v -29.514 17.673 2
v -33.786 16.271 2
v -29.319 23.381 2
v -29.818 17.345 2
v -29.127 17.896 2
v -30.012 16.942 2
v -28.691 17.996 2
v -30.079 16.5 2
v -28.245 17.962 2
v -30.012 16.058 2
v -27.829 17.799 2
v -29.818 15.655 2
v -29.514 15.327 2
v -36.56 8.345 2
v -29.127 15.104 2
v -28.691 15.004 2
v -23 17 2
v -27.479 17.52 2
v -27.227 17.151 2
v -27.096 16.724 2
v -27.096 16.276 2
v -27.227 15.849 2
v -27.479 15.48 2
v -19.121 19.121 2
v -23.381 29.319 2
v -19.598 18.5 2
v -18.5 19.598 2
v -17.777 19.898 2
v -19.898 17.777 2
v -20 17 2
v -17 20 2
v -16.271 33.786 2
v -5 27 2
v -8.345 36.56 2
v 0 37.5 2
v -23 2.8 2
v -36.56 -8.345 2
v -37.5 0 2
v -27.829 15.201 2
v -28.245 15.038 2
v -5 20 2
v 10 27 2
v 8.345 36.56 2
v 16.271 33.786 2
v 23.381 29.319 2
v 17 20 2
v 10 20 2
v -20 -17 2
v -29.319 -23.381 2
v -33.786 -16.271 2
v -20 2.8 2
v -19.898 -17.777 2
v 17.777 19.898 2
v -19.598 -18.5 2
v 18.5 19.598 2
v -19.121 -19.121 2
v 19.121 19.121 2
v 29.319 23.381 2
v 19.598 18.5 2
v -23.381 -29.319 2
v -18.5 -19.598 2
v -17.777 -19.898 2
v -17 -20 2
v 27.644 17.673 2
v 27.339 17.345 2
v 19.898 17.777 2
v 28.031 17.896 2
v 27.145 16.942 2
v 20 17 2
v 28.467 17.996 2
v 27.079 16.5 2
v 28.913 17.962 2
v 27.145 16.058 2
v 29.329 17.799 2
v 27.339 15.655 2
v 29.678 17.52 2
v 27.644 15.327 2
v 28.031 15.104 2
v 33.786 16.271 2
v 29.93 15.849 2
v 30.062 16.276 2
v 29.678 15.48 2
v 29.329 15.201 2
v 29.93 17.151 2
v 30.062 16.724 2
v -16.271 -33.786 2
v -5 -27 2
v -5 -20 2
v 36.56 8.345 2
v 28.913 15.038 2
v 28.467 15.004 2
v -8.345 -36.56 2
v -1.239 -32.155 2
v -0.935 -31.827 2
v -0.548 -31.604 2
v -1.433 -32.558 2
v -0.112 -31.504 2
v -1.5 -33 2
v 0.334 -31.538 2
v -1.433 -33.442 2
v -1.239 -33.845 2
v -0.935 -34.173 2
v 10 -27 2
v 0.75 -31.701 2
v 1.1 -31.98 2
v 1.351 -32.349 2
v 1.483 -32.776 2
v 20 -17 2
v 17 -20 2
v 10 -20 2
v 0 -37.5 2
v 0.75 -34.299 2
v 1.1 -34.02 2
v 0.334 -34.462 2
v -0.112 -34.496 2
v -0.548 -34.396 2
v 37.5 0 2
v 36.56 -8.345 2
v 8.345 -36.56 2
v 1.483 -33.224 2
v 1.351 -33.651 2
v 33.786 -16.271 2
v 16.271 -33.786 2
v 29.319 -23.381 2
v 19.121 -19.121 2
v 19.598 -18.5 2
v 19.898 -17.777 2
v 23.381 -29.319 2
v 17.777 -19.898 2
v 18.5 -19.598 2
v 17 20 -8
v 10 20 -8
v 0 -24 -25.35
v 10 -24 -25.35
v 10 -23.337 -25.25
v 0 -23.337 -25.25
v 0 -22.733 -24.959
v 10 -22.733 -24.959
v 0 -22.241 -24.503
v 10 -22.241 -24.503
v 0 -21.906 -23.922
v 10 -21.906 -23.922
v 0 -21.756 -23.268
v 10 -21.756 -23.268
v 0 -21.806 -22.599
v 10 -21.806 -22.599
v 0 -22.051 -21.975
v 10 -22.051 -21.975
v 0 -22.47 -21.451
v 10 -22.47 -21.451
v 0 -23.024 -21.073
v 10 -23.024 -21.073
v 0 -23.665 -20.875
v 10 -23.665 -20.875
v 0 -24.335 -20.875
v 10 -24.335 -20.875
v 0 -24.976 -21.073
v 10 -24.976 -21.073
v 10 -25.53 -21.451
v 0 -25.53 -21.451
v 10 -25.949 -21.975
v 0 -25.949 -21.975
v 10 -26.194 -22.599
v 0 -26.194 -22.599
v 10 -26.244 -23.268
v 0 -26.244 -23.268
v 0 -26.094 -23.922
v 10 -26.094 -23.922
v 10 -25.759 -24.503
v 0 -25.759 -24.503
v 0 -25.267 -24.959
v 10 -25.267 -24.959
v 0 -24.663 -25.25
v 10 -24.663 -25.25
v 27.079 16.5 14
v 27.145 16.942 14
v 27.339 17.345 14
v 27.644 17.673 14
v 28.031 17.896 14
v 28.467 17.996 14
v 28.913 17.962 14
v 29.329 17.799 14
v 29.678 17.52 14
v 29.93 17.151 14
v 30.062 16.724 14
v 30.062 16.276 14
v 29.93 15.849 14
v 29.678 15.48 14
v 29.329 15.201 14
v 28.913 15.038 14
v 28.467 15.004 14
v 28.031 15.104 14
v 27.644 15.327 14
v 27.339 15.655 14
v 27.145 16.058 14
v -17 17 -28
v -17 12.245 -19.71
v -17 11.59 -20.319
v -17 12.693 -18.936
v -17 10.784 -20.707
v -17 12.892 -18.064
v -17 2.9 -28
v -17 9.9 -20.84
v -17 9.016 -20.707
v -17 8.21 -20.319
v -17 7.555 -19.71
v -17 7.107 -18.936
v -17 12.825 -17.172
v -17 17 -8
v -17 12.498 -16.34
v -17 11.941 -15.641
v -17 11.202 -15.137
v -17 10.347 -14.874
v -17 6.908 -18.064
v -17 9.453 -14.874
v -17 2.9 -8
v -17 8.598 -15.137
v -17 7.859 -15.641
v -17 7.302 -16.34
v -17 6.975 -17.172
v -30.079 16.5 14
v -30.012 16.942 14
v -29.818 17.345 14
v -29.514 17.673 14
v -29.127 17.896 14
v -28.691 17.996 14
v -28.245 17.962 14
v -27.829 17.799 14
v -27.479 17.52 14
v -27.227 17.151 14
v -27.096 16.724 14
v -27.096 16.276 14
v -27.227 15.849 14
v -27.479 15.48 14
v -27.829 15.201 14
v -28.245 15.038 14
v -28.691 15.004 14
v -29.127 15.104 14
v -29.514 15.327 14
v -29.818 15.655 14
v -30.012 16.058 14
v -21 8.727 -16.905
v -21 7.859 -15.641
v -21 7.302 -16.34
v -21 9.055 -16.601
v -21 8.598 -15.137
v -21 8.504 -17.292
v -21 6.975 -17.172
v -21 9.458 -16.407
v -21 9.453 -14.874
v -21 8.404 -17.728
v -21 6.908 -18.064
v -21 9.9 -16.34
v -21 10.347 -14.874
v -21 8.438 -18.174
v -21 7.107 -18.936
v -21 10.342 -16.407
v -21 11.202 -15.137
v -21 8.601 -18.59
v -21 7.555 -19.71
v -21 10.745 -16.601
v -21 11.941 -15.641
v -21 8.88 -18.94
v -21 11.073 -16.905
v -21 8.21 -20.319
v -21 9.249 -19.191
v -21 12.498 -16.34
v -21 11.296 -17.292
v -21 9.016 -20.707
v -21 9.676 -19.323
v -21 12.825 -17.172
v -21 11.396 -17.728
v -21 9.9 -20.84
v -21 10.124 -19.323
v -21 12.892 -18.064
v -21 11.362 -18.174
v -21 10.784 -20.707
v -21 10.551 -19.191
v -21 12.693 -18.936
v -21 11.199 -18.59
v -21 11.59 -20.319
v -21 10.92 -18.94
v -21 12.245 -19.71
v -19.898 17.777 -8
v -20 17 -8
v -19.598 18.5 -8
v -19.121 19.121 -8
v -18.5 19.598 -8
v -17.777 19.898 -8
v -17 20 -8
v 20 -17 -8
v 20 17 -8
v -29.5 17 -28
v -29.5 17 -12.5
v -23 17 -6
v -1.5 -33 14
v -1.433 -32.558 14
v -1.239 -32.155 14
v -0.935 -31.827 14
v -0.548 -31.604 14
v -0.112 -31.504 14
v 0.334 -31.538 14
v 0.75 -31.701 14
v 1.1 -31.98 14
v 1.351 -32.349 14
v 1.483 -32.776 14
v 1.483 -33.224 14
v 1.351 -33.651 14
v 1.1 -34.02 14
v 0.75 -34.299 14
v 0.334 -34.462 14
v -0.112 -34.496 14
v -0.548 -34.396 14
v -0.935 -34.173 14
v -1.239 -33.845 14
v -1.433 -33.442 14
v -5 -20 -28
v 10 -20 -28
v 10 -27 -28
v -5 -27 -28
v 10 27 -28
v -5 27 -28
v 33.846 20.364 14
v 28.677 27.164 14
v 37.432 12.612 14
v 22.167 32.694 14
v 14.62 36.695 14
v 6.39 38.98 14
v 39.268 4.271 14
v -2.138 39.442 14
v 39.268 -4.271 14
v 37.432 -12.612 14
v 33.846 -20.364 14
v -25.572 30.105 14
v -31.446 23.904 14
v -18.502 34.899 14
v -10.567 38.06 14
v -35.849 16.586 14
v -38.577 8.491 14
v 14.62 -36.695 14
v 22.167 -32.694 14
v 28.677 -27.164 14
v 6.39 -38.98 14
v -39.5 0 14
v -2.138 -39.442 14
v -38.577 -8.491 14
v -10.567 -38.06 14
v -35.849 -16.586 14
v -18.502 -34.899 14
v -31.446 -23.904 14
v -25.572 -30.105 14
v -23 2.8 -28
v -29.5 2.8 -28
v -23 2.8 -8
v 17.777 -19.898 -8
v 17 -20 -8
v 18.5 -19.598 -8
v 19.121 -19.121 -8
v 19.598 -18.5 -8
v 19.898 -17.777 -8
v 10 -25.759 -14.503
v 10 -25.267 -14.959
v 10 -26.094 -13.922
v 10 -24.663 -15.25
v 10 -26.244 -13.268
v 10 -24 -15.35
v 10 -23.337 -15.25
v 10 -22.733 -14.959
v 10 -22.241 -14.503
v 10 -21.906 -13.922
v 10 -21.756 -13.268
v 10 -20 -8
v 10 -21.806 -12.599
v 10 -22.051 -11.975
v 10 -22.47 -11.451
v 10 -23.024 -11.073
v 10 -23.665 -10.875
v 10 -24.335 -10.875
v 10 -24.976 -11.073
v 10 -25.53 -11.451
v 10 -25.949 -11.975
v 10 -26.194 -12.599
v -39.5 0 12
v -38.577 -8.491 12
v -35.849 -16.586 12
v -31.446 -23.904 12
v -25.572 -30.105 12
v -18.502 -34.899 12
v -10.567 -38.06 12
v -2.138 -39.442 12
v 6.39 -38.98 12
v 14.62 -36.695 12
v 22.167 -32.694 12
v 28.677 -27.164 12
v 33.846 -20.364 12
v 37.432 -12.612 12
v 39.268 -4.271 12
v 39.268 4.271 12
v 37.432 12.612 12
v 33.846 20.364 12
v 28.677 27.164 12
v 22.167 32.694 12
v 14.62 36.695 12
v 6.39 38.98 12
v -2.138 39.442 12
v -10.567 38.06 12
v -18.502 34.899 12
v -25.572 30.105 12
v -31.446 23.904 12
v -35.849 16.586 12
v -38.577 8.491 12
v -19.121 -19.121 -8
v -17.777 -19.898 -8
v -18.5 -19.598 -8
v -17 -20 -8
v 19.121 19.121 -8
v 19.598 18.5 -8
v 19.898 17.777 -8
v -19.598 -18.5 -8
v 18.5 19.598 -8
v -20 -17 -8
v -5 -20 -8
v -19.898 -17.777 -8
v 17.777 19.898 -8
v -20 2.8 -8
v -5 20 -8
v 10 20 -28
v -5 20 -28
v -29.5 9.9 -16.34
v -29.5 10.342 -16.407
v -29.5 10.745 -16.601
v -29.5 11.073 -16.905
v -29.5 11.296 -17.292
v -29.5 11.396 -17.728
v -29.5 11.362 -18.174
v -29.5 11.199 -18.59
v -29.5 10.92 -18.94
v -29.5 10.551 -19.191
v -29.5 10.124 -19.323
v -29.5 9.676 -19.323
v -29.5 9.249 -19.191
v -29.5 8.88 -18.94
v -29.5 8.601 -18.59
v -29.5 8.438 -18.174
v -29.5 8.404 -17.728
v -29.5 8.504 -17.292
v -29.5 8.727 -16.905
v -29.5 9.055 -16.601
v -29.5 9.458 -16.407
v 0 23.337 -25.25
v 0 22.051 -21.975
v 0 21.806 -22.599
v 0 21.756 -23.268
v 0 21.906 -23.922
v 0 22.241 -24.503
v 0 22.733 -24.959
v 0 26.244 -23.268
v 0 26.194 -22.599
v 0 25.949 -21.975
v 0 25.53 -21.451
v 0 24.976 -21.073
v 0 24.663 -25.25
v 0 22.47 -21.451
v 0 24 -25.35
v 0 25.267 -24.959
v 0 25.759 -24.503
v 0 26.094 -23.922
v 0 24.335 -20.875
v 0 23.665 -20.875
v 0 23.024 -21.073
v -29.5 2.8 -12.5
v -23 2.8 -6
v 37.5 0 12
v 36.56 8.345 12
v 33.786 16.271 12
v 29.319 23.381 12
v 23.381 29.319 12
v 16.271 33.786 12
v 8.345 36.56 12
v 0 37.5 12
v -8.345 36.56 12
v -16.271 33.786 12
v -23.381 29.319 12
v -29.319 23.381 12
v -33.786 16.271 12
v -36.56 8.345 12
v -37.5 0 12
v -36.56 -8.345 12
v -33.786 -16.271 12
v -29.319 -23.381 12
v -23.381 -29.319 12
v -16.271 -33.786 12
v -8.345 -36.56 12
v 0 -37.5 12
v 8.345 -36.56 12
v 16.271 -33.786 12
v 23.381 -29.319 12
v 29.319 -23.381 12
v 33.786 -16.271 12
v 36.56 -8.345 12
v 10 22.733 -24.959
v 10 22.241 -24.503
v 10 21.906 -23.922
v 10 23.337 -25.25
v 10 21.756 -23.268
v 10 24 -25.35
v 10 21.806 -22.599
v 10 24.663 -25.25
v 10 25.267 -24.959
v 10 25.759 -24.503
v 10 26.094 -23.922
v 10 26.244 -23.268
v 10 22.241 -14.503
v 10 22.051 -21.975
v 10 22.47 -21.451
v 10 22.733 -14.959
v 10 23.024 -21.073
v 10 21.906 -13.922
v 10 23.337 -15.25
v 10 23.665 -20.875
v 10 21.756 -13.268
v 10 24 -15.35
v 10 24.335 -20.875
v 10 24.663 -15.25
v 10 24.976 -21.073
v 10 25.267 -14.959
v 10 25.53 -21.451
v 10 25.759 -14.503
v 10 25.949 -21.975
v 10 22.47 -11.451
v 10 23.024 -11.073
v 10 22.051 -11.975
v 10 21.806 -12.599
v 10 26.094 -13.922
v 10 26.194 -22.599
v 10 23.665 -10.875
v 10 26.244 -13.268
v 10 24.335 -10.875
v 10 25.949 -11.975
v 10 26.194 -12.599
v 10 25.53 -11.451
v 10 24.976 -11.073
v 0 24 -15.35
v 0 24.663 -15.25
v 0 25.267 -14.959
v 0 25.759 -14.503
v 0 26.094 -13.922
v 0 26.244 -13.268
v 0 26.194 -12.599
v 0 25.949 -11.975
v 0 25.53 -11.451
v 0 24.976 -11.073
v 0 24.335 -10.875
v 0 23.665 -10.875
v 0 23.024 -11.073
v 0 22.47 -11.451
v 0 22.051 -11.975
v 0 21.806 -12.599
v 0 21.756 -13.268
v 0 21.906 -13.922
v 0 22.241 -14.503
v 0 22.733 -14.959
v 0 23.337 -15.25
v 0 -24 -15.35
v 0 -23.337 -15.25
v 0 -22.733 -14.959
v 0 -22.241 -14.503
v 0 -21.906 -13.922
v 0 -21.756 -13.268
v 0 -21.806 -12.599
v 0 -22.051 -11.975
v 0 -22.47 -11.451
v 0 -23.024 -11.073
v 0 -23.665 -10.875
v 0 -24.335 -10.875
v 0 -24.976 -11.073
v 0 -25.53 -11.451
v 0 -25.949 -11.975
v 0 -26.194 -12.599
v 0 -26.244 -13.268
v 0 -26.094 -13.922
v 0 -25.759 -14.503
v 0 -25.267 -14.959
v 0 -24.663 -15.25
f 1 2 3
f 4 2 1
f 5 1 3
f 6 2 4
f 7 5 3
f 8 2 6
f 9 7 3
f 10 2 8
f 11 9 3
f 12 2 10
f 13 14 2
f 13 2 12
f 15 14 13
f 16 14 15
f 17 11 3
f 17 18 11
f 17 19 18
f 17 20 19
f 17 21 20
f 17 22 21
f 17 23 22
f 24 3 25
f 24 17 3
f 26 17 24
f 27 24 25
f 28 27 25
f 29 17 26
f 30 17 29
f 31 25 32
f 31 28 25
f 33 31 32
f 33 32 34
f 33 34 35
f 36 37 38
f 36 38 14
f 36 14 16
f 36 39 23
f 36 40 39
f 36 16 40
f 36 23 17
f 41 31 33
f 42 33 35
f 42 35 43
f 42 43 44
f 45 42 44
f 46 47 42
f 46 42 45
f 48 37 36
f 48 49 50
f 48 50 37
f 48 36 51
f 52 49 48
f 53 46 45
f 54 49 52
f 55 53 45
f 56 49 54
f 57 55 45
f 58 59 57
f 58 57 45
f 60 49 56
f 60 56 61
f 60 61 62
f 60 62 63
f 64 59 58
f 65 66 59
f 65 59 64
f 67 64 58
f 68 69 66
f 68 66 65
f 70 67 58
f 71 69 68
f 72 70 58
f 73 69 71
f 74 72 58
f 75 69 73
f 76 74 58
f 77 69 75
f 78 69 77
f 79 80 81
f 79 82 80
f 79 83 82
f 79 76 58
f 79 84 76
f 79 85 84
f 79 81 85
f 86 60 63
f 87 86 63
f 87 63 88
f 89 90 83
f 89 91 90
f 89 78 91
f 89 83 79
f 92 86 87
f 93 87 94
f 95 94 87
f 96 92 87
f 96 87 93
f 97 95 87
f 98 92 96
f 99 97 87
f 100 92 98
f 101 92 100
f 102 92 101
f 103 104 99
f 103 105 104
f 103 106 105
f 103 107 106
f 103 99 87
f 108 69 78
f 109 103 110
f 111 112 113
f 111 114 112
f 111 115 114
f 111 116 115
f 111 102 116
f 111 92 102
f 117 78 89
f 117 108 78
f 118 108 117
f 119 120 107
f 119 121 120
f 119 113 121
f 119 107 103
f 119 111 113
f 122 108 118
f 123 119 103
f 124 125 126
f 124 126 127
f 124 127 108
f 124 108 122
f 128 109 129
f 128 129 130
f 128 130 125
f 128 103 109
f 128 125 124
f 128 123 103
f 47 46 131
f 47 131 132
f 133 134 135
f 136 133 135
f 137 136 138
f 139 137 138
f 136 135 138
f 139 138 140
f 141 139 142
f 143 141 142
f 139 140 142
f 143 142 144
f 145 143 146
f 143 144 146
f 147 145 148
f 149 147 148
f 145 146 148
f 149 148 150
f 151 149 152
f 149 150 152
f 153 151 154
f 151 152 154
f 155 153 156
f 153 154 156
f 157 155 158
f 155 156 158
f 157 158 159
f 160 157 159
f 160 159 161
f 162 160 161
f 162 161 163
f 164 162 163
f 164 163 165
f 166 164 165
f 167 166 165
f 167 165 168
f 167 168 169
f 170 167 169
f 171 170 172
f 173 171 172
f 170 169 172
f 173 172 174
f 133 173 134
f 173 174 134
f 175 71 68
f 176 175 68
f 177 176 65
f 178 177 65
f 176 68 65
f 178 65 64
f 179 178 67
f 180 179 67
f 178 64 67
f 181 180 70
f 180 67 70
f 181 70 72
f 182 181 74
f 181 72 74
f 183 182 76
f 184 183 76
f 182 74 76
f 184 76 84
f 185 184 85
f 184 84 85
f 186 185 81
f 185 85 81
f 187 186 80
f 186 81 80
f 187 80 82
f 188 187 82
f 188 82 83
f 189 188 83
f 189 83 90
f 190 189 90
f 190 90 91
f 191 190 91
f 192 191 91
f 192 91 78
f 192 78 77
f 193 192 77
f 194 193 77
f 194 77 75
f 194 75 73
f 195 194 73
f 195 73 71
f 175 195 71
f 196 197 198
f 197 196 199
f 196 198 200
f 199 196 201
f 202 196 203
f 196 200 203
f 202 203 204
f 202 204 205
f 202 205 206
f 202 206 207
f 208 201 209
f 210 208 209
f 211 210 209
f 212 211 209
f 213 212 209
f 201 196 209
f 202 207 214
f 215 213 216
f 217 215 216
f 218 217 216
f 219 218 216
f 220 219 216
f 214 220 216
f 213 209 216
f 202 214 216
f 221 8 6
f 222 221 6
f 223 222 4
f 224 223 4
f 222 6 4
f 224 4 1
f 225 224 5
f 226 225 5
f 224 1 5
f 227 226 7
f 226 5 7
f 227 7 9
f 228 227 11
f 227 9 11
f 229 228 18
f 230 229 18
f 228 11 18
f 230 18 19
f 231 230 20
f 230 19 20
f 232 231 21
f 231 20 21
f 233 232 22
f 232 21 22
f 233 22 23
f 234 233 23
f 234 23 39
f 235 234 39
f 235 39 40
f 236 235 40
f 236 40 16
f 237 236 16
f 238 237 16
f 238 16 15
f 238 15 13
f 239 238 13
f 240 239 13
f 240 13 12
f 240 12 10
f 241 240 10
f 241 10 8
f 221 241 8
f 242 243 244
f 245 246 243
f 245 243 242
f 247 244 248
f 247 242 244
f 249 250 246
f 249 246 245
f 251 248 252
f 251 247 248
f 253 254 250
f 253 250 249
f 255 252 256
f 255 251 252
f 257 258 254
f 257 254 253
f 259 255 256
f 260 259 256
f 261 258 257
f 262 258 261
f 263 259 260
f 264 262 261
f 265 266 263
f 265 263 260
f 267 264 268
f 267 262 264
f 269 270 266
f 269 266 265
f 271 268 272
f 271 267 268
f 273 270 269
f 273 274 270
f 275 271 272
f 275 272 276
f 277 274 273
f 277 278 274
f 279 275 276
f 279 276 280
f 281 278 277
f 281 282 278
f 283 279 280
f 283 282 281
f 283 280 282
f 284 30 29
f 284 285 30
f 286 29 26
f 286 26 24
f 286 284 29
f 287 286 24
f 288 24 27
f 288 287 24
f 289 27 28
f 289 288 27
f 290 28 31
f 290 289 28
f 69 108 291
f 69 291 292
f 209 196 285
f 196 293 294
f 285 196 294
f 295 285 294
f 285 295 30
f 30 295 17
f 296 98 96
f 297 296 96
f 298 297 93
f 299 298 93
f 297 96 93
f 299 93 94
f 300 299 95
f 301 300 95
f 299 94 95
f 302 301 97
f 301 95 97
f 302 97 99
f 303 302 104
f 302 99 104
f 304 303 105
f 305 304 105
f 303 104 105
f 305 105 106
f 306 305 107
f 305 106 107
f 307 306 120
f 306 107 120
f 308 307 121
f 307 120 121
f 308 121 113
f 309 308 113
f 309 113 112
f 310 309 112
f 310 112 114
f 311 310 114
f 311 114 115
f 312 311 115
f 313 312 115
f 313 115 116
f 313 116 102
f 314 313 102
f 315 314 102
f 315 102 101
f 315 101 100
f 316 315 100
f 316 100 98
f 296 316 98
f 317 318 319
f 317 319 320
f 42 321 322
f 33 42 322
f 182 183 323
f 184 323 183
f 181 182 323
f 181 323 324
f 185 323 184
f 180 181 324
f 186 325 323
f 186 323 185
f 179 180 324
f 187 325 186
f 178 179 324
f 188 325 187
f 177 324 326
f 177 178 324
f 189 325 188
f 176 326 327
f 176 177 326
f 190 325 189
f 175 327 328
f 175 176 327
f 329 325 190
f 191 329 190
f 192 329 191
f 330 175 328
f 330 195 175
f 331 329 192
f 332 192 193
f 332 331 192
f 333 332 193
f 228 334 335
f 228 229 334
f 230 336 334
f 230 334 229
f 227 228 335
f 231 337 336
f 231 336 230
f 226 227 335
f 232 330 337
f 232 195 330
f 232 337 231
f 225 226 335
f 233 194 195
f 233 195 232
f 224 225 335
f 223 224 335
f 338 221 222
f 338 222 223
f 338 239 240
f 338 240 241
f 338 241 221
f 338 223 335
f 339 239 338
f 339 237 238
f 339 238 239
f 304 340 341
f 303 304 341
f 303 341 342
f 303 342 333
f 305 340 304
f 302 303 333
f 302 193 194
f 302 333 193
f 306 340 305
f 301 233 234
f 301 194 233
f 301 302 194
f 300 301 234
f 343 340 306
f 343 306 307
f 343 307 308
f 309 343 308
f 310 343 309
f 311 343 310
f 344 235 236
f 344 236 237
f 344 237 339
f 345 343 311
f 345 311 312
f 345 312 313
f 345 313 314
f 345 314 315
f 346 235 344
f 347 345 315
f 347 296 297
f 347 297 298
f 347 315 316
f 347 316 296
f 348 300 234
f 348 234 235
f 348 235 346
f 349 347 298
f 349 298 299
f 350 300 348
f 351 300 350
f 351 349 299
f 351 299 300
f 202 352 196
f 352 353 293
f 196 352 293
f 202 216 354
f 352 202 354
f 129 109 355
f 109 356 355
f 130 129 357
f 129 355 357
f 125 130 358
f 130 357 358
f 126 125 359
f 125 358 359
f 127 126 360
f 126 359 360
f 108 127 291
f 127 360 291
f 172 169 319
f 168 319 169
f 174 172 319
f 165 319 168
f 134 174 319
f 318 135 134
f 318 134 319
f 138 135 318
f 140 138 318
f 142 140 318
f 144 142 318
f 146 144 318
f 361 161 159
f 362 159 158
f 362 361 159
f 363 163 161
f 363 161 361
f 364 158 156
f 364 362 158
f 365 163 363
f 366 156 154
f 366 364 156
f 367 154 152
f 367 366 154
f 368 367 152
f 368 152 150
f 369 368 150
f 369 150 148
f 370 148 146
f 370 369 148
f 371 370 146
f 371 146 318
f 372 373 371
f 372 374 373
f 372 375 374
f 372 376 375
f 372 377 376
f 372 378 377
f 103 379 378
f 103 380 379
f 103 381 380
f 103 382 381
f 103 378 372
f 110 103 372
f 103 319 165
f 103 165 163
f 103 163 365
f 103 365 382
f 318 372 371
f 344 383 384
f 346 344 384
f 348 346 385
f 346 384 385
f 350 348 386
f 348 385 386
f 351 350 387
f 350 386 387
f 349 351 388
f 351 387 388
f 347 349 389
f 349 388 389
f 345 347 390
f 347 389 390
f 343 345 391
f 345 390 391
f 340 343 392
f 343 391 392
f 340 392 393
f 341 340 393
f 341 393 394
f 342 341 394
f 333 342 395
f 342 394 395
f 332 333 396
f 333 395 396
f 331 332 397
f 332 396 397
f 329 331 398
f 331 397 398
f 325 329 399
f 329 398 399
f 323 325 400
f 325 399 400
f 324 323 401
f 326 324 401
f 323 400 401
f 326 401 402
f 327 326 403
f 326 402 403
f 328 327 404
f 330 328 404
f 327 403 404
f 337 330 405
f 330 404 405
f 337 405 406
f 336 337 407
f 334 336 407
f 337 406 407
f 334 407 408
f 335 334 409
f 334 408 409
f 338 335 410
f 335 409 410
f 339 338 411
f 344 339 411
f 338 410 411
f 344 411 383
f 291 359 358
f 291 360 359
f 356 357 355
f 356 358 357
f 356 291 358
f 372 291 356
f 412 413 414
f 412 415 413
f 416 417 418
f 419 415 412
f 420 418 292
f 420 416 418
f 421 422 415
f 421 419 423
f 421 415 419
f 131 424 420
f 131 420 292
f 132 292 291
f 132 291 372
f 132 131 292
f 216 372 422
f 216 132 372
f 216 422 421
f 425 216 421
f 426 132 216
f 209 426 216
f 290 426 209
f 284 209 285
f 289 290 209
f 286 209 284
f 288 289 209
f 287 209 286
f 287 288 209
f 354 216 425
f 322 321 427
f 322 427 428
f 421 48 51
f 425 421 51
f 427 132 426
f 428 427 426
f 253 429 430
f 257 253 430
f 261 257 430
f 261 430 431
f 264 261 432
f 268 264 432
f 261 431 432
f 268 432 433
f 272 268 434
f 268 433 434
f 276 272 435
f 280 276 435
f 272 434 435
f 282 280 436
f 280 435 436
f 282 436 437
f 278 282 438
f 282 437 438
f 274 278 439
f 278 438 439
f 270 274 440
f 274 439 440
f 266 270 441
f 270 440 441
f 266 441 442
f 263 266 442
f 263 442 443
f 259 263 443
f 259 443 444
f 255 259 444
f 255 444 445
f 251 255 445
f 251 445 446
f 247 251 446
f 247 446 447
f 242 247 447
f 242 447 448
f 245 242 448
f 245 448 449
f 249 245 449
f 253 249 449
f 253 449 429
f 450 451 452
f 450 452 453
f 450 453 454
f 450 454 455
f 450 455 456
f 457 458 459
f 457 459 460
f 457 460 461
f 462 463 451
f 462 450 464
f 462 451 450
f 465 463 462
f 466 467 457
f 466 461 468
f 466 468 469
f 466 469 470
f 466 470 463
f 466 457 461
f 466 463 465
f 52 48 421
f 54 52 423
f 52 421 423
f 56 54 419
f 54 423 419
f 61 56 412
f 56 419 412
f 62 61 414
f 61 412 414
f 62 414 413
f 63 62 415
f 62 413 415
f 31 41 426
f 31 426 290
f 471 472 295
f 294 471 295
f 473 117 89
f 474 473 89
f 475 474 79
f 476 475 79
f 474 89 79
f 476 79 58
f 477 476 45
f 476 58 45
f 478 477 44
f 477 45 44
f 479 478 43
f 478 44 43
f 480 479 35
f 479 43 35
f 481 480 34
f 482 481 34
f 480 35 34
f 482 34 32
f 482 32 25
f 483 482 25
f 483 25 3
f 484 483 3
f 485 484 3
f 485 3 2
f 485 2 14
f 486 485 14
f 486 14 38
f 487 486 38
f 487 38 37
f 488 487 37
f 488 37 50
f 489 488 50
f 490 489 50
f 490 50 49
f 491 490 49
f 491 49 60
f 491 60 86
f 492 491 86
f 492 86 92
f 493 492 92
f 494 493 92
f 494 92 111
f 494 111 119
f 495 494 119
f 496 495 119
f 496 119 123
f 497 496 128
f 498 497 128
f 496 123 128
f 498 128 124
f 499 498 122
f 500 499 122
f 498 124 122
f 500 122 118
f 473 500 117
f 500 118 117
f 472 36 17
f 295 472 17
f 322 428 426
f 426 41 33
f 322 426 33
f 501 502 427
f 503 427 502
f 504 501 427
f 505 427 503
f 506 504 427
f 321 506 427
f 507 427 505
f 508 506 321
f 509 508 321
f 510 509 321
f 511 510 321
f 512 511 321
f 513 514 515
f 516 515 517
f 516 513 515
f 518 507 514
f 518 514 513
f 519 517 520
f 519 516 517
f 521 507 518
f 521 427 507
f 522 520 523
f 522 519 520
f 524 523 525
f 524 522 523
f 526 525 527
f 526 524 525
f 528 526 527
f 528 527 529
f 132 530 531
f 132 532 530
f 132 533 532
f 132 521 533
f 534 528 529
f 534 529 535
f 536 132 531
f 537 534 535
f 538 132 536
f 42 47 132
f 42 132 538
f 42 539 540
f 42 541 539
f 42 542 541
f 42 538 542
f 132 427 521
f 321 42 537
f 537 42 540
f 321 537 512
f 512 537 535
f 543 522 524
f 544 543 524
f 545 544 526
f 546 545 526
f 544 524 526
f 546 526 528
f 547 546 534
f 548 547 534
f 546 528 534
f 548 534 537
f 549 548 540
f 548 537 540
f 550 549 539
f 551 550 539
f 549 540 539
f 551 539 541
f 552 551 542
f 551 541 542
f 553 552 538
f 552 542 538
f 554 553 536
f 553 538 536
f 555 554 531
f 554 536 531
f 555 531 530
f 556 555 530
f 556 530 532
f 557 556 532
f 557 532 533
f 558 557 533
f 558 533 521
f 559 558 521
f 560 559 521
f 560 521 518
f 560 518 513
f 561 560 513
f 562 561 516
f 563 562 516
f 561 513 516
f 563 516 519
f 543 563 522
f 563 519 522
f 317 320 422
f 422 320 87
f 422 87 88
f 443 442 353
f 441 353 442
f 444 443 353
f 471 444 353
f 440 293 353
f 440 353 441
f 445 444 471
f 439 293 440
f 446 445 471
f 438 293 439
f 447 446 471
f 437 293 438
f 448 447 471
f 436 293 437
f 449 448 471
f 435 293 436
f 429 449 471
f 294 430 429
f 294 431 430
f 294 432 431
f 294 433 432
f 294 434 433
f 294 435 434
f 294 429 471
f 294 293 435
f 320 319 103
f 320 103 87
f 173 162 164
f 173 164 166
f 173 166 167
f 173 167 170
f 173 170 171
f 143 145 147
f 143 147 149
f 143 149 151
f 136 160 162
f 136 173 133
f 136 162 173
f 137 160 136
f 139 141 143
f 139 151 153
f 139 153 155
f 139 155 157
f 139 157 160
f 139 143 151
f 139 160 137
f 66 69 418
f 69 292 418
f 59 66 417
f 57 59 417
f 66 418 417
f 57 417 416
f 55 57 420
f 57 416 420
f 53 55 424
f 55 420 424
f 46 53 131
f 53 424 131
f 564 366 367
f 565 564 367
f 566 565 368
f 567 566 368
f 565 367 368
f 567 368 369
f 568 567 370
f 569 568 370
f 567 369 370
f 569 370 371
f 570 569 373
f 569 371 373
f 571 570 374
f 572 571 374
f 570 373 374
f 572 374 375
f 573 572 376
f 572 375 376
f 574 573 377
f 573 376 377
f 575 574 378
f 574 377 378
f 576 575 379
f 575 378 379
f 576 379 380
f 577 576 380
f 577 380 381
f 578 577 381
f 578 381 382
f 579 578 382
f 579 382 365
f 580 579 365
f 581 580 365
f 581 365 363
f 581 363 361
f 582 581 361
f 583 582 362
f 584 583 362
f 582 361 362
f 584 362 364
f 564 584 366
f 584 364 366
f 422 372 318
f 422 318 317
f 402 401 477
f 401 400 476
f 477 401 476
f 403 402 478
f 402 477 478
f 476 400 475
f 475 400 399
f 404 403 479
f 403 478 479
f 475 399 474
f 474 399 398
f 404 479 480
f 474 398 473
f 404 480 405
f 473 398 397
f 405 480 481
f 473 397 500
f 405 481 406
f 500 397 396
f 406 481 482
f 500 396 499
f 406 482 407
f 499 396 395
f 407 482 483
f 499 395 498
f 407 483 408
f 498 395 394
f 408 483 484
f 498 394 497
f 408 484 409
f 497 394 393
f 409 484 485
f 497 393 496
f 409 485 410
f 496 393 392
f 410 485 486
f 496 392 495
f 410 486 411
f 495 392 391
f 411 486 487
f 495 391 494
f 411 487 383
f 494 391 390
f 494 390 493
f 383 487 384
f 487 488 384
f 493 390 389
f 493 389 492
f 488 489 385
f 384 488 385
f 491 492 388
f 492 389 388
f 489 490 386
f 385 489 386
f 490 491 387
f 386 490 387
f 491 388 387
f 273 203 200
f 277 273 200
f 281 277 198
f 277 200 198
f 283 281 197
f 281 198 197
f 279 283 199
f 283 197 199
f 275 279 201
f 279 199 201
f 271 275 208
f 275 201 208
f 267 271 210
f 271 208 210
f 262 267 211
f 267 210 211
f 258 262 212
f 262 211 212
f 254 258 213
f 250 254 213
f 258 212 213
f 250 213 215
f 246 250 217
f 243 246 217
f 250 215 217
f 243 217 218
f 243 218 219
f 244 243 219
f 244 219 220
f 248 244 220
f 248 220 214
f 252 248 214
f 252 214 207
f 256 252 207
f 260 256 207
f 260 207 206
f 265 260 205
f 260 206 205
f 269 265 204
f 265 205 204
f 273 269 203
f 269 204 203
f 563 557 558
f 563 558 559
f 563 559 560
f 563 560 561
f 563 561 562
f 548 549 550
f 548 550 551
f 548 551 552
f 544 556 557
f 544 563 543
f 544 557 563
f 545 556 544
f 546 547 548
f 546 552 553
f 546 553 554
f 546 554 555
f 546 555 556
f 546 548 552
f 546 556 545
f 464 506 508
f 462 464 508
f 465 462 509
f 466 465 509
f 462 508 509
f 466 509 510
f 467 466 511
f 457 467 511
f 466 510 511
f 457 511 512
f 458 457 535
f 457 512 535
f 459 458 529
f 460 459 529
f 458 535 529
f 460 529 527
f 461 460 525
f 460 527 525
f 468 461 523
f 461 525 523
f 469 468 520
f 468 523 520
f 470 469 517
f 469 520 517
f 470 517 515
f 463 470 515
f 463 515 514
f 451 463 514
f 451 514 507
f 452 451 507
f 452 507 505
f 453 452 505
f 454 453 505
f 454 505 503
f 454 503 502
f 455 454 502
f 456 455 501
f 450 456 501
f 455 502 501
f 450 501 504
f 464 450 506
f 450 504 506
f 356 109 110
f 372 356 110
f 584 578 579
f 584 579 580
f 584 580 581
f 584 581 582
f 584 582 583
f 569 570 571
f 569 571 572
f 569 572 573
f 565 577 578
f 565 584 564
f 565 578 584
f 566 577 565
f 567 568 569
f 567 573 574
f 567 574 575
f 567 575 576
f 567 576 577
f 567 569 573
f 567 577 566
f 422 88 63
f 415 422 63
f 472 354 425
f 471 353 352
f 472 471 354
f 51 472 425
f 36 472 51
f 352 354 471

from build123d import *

# Parameters (mm, degrees)
SKETCH_1_R          = 37.5
EXTRUDE_3_DEPTH     = 14
SKETCH_2_R          = 39.5
SKETCH_2_R_2        = 37.5
EXTRUDE_4_DEPTH     = 2
EXTRUDE_START       = -2
SKETCH_3_R          = 39.5
SKETCH_3_R_2        = 37.5
EXTRUDE_5_DEPTH     = 2
SKETCH_4_R          = 39.5
CUT_EXTRUDE_1_DEPTH = 2
SKETCH_5_R          = 1.5
CUT_EXTRUDE_3_DEPTH = 58.135803136
SKETCH_6_W          = 40
SKETCH_6_H          = 40
EXTRUDE_6_DEPTH     = 10
SKETCH_7_W          = 15
SKETCH_7_H          = 7
EXTRUDE_7_DEPTH     = 30
SKETCH_8_W          = 3
SKETCH_8_H          = 14.2
EXTRUDE_9_DEPTH     = 10
EXTRUDE_10_DEPTH    = 20
SKETCH_10_R         = 1.5
CUT_EXTRUDE_4_DEPTH = 20
FILLET_1_R          = 3
EXTRUDE_START_2     = 6.5
SKETCH_11_W         = 22
SKETCH_11_H         = 14.2
SKETCH_11_R         = 1.5
EXTRUDE_11_DEPTH    = 6.5
CHAMFER_1_SIZE      = 6.5
SKETCH_12_R         = 3
CUT_EXTRUDE_5_DEPTH = 4
SKETCH_13_R         = 2.25
CUT_EXTRUDE_6_DEPTH = 10
SKETCH_15_R         = 2.25
CUT_EXTRUDE_7_DEPTH = 10


with BuildPart() as part:
    # 草图1 → 凸台-拉伸3 (new body)
    with BuildSketch(Plane.XY):
        Circle(SKETCH_1_R)
    extrude(amount=EXTRUDE_3_DEPTH)

    # 草图2 → 凸台-拉伸4 (add)
    with BuildSketch(Plane(origin=(0, 0, 0), x_dir=(-1, 0, 0), z_dir=(0, 0, -1))):
        Circle(SKETCH_2_R)
        Circle(SKETCH_2_R_2, mode=Mode.SUBTRACT)
    extrude(amount=-EXTRUDE_4_DEPTH)

    # 草图3 → 凸台-拉伸5 (add)
    with BuildSketch(Plane.XY.offset(14).offset(EXTRUDE_START)):
        with Locations(Location((0, 0, 0), (0, 0, 180))):
            Circle(SKETCH_3_R)
        with Locations(Location((0, 0, 0), (0, 0, 180))):
            Circle(SKETCH_3_R_2, mode=Mode.SUBTRACT)
    extrude(amount=EXTRUDE_5_DEPTH)

    # 草图4 → 切除-拉伸1 (cut)
    with BuildSketch(Plane(origin=(0, 0, 0), x_dir=(-1, 0, 0), z_dir=(0, 0, -1))):
        with Locations(Location((0, 0, 0), (0, 0, 180))):
            Circle(SKETCH_4_R)
    extrude(amount=-CUT_EXTRUDE_1_DEPTH, mode=Mode.SUBTRACT)

    # 草图5 → 切除-拉伸3 (cut, through all)
    with BuildSketch(Plane(origin=(0, 0, 2), x_dir=(-1, 0, 0), z_dir=(0, 0, -1))):
        with Locations((0, -33)):
            Circle(SKETCH_5_R)
        with Locations((-28.578838325, 16.5)):
            Circle(SKETCH_5_R)
        with Locations((28.578838325, 16.5)):
            Circle(SKETCH_5_R)
    extrude(amount=-CUT_EXTRUDE_3_DEPTH, mode=Mode.SUBTRACT)

    # 草图6 → 凸台-拉伸6 (add)
    with BuildSketch(Plane(origin=(0, 0, 2), x_dir=(-1, 0, 0), z_dir=(0, 0, -1))):
        Rectangle(SKETCH_6_W, SKETCH_6_H)
    extrude(amount=EXTRUDE_6_DEPTH)

    # 草图7 → 凸台-拉伸7 (add)
    with BuildSketch(Plane(origin=(0, 0, 2), x_dir=(-1, 0, 0), z_dir=(0, 0, -1))):
        with Locations((-2.5, -23.5)):
            Rectangle(SKETCH_7_W, SKETCH_7_H)
        with Locations((-2.5, 23.5)):
            Rectangle(SKETCH_7_W, SKETCH_7_H)
    extrude(amount=EXTRUDE_7_DEPTH)

    # 草图8 → 凸台-拉伸9 (add)
    with BuildSketch(Plane(origin=(0, 0, -8), x_dir=(-1, 0, 0), z_dir=(0, 0, -1))):
        with Locations((21.5, 9.9)):
            Rectangle(SKETCH_8_W, SKETCH_8_H)
        with Locations((18.5, 9.9)):
            Rectangle(SKETCH_8_W, SKETCH_8_H)
    extrude(amount=-EXTRUDE_9_DEPTH)

    # 草图9 → 凸台-拉伸10 (add)
    with BuildSketch(Plane(origin=(0, 0, -8), x_dir=(-1, 0, 0), z_dir=(0, 0, -1))):
        Polygon((23, 17), (17, 17), (17, 2.9), (23, 2.8), align=None)
    extrude(amount=EXTRUDE_10_DEPTH)

    # 草图10 → 切除-拉伸4 (cut)
    with BuildSketch(Plane.ZY.offset(23)):
        with Locations((-17.84, 9.9)):
            Circle(SKETCH_10_R)
    extrude(amount=-CUT_EXTRUDE_4_DEPTH, mode=Mode.SUBTRACT)

    # 圆角1
    fillet_1_edges = [part.edges().sort_by_distance(p)[0] for p in [
        (-20, -20, -3),
        (-20, 20, -3),
        (20, 20, -3),
        (20, -20, -3),
    ]]
    fillet(fillet_1_edges, radius=FILLET_1_R - 0.0001)  # a hair under: the kernel refuses the full size

    # 草图11 → 凸台-拉伸11 (add)
    with BuildSketch(Plane.ZY.offset(23).offset(EXTRUDE_START_2)):
        with Locations((-17, 9.9)):
            Rectangle(SKETCH_11_W, SKETCH_11_H)
        with Locations((-17.84, 9.9)):
            Circle(SKETCH_11_R, mode=Mode.SUBTRACT)
    extrude(amount=-EXTRUDE_11_DEPTH)

    # 倒角1
    chamfer_1_edges = [part.edges().sort_by_distance(p)[0] for p in [
        (-29.5, 9.9, -6),
    ]]
    chamfer(chamfer_1_edges, length=CHAMFER_1_SIZE - 0.0001)  # a hair under: the kernel refuses the full size

    # 草图12 → 切除-拉伸5 (cut)
    with BuildSketch(Plane(origin=(-17, 0, 0), x_dir=(0, 0, -1), z_dir=(1, 0, 0))):
        with Locations((17.84, 9.9)):
            Circle(SKETCH_12_R)
    extrude(amount=-CUT_EXTRUDE_5_DEPTH, mode=Mode.SUBTRACT)

    # 草图13 → 切除-拉伸6 (cut)
    with BuildSketch(Plane(origin=(10, 0, 0), x_dir=(0, 0, -1), z_dir=(1, 0, 0))):
        with Locations((23.1, -24)):
            Circle(SKETCH_13_R)
        with Locations((13.1, -24)):
            Circle(SKETCH_13_R)
    extrude(amount=-CUT_EXTRUDE_6_DEPTH, mode=Mode.SUBTRACT)

    # 草图15 → 切除-拉伸7 (cut)
    with BuildSketch(Plane(origin=(10, 0, 0), x_dir=(0, 0, -1), z_dir=(1, 0, 0))):
        with Locations((23.1, 24)):
            Circle(SKETCH_15_R)
        with Locations((13.1, 24)):
            Circle(SKETCH_15_R)
    extrude(amount=-CUT_EXTRUDE_7_DEPTH, mode=Mode.SUBTRACT)


solid = part.part
